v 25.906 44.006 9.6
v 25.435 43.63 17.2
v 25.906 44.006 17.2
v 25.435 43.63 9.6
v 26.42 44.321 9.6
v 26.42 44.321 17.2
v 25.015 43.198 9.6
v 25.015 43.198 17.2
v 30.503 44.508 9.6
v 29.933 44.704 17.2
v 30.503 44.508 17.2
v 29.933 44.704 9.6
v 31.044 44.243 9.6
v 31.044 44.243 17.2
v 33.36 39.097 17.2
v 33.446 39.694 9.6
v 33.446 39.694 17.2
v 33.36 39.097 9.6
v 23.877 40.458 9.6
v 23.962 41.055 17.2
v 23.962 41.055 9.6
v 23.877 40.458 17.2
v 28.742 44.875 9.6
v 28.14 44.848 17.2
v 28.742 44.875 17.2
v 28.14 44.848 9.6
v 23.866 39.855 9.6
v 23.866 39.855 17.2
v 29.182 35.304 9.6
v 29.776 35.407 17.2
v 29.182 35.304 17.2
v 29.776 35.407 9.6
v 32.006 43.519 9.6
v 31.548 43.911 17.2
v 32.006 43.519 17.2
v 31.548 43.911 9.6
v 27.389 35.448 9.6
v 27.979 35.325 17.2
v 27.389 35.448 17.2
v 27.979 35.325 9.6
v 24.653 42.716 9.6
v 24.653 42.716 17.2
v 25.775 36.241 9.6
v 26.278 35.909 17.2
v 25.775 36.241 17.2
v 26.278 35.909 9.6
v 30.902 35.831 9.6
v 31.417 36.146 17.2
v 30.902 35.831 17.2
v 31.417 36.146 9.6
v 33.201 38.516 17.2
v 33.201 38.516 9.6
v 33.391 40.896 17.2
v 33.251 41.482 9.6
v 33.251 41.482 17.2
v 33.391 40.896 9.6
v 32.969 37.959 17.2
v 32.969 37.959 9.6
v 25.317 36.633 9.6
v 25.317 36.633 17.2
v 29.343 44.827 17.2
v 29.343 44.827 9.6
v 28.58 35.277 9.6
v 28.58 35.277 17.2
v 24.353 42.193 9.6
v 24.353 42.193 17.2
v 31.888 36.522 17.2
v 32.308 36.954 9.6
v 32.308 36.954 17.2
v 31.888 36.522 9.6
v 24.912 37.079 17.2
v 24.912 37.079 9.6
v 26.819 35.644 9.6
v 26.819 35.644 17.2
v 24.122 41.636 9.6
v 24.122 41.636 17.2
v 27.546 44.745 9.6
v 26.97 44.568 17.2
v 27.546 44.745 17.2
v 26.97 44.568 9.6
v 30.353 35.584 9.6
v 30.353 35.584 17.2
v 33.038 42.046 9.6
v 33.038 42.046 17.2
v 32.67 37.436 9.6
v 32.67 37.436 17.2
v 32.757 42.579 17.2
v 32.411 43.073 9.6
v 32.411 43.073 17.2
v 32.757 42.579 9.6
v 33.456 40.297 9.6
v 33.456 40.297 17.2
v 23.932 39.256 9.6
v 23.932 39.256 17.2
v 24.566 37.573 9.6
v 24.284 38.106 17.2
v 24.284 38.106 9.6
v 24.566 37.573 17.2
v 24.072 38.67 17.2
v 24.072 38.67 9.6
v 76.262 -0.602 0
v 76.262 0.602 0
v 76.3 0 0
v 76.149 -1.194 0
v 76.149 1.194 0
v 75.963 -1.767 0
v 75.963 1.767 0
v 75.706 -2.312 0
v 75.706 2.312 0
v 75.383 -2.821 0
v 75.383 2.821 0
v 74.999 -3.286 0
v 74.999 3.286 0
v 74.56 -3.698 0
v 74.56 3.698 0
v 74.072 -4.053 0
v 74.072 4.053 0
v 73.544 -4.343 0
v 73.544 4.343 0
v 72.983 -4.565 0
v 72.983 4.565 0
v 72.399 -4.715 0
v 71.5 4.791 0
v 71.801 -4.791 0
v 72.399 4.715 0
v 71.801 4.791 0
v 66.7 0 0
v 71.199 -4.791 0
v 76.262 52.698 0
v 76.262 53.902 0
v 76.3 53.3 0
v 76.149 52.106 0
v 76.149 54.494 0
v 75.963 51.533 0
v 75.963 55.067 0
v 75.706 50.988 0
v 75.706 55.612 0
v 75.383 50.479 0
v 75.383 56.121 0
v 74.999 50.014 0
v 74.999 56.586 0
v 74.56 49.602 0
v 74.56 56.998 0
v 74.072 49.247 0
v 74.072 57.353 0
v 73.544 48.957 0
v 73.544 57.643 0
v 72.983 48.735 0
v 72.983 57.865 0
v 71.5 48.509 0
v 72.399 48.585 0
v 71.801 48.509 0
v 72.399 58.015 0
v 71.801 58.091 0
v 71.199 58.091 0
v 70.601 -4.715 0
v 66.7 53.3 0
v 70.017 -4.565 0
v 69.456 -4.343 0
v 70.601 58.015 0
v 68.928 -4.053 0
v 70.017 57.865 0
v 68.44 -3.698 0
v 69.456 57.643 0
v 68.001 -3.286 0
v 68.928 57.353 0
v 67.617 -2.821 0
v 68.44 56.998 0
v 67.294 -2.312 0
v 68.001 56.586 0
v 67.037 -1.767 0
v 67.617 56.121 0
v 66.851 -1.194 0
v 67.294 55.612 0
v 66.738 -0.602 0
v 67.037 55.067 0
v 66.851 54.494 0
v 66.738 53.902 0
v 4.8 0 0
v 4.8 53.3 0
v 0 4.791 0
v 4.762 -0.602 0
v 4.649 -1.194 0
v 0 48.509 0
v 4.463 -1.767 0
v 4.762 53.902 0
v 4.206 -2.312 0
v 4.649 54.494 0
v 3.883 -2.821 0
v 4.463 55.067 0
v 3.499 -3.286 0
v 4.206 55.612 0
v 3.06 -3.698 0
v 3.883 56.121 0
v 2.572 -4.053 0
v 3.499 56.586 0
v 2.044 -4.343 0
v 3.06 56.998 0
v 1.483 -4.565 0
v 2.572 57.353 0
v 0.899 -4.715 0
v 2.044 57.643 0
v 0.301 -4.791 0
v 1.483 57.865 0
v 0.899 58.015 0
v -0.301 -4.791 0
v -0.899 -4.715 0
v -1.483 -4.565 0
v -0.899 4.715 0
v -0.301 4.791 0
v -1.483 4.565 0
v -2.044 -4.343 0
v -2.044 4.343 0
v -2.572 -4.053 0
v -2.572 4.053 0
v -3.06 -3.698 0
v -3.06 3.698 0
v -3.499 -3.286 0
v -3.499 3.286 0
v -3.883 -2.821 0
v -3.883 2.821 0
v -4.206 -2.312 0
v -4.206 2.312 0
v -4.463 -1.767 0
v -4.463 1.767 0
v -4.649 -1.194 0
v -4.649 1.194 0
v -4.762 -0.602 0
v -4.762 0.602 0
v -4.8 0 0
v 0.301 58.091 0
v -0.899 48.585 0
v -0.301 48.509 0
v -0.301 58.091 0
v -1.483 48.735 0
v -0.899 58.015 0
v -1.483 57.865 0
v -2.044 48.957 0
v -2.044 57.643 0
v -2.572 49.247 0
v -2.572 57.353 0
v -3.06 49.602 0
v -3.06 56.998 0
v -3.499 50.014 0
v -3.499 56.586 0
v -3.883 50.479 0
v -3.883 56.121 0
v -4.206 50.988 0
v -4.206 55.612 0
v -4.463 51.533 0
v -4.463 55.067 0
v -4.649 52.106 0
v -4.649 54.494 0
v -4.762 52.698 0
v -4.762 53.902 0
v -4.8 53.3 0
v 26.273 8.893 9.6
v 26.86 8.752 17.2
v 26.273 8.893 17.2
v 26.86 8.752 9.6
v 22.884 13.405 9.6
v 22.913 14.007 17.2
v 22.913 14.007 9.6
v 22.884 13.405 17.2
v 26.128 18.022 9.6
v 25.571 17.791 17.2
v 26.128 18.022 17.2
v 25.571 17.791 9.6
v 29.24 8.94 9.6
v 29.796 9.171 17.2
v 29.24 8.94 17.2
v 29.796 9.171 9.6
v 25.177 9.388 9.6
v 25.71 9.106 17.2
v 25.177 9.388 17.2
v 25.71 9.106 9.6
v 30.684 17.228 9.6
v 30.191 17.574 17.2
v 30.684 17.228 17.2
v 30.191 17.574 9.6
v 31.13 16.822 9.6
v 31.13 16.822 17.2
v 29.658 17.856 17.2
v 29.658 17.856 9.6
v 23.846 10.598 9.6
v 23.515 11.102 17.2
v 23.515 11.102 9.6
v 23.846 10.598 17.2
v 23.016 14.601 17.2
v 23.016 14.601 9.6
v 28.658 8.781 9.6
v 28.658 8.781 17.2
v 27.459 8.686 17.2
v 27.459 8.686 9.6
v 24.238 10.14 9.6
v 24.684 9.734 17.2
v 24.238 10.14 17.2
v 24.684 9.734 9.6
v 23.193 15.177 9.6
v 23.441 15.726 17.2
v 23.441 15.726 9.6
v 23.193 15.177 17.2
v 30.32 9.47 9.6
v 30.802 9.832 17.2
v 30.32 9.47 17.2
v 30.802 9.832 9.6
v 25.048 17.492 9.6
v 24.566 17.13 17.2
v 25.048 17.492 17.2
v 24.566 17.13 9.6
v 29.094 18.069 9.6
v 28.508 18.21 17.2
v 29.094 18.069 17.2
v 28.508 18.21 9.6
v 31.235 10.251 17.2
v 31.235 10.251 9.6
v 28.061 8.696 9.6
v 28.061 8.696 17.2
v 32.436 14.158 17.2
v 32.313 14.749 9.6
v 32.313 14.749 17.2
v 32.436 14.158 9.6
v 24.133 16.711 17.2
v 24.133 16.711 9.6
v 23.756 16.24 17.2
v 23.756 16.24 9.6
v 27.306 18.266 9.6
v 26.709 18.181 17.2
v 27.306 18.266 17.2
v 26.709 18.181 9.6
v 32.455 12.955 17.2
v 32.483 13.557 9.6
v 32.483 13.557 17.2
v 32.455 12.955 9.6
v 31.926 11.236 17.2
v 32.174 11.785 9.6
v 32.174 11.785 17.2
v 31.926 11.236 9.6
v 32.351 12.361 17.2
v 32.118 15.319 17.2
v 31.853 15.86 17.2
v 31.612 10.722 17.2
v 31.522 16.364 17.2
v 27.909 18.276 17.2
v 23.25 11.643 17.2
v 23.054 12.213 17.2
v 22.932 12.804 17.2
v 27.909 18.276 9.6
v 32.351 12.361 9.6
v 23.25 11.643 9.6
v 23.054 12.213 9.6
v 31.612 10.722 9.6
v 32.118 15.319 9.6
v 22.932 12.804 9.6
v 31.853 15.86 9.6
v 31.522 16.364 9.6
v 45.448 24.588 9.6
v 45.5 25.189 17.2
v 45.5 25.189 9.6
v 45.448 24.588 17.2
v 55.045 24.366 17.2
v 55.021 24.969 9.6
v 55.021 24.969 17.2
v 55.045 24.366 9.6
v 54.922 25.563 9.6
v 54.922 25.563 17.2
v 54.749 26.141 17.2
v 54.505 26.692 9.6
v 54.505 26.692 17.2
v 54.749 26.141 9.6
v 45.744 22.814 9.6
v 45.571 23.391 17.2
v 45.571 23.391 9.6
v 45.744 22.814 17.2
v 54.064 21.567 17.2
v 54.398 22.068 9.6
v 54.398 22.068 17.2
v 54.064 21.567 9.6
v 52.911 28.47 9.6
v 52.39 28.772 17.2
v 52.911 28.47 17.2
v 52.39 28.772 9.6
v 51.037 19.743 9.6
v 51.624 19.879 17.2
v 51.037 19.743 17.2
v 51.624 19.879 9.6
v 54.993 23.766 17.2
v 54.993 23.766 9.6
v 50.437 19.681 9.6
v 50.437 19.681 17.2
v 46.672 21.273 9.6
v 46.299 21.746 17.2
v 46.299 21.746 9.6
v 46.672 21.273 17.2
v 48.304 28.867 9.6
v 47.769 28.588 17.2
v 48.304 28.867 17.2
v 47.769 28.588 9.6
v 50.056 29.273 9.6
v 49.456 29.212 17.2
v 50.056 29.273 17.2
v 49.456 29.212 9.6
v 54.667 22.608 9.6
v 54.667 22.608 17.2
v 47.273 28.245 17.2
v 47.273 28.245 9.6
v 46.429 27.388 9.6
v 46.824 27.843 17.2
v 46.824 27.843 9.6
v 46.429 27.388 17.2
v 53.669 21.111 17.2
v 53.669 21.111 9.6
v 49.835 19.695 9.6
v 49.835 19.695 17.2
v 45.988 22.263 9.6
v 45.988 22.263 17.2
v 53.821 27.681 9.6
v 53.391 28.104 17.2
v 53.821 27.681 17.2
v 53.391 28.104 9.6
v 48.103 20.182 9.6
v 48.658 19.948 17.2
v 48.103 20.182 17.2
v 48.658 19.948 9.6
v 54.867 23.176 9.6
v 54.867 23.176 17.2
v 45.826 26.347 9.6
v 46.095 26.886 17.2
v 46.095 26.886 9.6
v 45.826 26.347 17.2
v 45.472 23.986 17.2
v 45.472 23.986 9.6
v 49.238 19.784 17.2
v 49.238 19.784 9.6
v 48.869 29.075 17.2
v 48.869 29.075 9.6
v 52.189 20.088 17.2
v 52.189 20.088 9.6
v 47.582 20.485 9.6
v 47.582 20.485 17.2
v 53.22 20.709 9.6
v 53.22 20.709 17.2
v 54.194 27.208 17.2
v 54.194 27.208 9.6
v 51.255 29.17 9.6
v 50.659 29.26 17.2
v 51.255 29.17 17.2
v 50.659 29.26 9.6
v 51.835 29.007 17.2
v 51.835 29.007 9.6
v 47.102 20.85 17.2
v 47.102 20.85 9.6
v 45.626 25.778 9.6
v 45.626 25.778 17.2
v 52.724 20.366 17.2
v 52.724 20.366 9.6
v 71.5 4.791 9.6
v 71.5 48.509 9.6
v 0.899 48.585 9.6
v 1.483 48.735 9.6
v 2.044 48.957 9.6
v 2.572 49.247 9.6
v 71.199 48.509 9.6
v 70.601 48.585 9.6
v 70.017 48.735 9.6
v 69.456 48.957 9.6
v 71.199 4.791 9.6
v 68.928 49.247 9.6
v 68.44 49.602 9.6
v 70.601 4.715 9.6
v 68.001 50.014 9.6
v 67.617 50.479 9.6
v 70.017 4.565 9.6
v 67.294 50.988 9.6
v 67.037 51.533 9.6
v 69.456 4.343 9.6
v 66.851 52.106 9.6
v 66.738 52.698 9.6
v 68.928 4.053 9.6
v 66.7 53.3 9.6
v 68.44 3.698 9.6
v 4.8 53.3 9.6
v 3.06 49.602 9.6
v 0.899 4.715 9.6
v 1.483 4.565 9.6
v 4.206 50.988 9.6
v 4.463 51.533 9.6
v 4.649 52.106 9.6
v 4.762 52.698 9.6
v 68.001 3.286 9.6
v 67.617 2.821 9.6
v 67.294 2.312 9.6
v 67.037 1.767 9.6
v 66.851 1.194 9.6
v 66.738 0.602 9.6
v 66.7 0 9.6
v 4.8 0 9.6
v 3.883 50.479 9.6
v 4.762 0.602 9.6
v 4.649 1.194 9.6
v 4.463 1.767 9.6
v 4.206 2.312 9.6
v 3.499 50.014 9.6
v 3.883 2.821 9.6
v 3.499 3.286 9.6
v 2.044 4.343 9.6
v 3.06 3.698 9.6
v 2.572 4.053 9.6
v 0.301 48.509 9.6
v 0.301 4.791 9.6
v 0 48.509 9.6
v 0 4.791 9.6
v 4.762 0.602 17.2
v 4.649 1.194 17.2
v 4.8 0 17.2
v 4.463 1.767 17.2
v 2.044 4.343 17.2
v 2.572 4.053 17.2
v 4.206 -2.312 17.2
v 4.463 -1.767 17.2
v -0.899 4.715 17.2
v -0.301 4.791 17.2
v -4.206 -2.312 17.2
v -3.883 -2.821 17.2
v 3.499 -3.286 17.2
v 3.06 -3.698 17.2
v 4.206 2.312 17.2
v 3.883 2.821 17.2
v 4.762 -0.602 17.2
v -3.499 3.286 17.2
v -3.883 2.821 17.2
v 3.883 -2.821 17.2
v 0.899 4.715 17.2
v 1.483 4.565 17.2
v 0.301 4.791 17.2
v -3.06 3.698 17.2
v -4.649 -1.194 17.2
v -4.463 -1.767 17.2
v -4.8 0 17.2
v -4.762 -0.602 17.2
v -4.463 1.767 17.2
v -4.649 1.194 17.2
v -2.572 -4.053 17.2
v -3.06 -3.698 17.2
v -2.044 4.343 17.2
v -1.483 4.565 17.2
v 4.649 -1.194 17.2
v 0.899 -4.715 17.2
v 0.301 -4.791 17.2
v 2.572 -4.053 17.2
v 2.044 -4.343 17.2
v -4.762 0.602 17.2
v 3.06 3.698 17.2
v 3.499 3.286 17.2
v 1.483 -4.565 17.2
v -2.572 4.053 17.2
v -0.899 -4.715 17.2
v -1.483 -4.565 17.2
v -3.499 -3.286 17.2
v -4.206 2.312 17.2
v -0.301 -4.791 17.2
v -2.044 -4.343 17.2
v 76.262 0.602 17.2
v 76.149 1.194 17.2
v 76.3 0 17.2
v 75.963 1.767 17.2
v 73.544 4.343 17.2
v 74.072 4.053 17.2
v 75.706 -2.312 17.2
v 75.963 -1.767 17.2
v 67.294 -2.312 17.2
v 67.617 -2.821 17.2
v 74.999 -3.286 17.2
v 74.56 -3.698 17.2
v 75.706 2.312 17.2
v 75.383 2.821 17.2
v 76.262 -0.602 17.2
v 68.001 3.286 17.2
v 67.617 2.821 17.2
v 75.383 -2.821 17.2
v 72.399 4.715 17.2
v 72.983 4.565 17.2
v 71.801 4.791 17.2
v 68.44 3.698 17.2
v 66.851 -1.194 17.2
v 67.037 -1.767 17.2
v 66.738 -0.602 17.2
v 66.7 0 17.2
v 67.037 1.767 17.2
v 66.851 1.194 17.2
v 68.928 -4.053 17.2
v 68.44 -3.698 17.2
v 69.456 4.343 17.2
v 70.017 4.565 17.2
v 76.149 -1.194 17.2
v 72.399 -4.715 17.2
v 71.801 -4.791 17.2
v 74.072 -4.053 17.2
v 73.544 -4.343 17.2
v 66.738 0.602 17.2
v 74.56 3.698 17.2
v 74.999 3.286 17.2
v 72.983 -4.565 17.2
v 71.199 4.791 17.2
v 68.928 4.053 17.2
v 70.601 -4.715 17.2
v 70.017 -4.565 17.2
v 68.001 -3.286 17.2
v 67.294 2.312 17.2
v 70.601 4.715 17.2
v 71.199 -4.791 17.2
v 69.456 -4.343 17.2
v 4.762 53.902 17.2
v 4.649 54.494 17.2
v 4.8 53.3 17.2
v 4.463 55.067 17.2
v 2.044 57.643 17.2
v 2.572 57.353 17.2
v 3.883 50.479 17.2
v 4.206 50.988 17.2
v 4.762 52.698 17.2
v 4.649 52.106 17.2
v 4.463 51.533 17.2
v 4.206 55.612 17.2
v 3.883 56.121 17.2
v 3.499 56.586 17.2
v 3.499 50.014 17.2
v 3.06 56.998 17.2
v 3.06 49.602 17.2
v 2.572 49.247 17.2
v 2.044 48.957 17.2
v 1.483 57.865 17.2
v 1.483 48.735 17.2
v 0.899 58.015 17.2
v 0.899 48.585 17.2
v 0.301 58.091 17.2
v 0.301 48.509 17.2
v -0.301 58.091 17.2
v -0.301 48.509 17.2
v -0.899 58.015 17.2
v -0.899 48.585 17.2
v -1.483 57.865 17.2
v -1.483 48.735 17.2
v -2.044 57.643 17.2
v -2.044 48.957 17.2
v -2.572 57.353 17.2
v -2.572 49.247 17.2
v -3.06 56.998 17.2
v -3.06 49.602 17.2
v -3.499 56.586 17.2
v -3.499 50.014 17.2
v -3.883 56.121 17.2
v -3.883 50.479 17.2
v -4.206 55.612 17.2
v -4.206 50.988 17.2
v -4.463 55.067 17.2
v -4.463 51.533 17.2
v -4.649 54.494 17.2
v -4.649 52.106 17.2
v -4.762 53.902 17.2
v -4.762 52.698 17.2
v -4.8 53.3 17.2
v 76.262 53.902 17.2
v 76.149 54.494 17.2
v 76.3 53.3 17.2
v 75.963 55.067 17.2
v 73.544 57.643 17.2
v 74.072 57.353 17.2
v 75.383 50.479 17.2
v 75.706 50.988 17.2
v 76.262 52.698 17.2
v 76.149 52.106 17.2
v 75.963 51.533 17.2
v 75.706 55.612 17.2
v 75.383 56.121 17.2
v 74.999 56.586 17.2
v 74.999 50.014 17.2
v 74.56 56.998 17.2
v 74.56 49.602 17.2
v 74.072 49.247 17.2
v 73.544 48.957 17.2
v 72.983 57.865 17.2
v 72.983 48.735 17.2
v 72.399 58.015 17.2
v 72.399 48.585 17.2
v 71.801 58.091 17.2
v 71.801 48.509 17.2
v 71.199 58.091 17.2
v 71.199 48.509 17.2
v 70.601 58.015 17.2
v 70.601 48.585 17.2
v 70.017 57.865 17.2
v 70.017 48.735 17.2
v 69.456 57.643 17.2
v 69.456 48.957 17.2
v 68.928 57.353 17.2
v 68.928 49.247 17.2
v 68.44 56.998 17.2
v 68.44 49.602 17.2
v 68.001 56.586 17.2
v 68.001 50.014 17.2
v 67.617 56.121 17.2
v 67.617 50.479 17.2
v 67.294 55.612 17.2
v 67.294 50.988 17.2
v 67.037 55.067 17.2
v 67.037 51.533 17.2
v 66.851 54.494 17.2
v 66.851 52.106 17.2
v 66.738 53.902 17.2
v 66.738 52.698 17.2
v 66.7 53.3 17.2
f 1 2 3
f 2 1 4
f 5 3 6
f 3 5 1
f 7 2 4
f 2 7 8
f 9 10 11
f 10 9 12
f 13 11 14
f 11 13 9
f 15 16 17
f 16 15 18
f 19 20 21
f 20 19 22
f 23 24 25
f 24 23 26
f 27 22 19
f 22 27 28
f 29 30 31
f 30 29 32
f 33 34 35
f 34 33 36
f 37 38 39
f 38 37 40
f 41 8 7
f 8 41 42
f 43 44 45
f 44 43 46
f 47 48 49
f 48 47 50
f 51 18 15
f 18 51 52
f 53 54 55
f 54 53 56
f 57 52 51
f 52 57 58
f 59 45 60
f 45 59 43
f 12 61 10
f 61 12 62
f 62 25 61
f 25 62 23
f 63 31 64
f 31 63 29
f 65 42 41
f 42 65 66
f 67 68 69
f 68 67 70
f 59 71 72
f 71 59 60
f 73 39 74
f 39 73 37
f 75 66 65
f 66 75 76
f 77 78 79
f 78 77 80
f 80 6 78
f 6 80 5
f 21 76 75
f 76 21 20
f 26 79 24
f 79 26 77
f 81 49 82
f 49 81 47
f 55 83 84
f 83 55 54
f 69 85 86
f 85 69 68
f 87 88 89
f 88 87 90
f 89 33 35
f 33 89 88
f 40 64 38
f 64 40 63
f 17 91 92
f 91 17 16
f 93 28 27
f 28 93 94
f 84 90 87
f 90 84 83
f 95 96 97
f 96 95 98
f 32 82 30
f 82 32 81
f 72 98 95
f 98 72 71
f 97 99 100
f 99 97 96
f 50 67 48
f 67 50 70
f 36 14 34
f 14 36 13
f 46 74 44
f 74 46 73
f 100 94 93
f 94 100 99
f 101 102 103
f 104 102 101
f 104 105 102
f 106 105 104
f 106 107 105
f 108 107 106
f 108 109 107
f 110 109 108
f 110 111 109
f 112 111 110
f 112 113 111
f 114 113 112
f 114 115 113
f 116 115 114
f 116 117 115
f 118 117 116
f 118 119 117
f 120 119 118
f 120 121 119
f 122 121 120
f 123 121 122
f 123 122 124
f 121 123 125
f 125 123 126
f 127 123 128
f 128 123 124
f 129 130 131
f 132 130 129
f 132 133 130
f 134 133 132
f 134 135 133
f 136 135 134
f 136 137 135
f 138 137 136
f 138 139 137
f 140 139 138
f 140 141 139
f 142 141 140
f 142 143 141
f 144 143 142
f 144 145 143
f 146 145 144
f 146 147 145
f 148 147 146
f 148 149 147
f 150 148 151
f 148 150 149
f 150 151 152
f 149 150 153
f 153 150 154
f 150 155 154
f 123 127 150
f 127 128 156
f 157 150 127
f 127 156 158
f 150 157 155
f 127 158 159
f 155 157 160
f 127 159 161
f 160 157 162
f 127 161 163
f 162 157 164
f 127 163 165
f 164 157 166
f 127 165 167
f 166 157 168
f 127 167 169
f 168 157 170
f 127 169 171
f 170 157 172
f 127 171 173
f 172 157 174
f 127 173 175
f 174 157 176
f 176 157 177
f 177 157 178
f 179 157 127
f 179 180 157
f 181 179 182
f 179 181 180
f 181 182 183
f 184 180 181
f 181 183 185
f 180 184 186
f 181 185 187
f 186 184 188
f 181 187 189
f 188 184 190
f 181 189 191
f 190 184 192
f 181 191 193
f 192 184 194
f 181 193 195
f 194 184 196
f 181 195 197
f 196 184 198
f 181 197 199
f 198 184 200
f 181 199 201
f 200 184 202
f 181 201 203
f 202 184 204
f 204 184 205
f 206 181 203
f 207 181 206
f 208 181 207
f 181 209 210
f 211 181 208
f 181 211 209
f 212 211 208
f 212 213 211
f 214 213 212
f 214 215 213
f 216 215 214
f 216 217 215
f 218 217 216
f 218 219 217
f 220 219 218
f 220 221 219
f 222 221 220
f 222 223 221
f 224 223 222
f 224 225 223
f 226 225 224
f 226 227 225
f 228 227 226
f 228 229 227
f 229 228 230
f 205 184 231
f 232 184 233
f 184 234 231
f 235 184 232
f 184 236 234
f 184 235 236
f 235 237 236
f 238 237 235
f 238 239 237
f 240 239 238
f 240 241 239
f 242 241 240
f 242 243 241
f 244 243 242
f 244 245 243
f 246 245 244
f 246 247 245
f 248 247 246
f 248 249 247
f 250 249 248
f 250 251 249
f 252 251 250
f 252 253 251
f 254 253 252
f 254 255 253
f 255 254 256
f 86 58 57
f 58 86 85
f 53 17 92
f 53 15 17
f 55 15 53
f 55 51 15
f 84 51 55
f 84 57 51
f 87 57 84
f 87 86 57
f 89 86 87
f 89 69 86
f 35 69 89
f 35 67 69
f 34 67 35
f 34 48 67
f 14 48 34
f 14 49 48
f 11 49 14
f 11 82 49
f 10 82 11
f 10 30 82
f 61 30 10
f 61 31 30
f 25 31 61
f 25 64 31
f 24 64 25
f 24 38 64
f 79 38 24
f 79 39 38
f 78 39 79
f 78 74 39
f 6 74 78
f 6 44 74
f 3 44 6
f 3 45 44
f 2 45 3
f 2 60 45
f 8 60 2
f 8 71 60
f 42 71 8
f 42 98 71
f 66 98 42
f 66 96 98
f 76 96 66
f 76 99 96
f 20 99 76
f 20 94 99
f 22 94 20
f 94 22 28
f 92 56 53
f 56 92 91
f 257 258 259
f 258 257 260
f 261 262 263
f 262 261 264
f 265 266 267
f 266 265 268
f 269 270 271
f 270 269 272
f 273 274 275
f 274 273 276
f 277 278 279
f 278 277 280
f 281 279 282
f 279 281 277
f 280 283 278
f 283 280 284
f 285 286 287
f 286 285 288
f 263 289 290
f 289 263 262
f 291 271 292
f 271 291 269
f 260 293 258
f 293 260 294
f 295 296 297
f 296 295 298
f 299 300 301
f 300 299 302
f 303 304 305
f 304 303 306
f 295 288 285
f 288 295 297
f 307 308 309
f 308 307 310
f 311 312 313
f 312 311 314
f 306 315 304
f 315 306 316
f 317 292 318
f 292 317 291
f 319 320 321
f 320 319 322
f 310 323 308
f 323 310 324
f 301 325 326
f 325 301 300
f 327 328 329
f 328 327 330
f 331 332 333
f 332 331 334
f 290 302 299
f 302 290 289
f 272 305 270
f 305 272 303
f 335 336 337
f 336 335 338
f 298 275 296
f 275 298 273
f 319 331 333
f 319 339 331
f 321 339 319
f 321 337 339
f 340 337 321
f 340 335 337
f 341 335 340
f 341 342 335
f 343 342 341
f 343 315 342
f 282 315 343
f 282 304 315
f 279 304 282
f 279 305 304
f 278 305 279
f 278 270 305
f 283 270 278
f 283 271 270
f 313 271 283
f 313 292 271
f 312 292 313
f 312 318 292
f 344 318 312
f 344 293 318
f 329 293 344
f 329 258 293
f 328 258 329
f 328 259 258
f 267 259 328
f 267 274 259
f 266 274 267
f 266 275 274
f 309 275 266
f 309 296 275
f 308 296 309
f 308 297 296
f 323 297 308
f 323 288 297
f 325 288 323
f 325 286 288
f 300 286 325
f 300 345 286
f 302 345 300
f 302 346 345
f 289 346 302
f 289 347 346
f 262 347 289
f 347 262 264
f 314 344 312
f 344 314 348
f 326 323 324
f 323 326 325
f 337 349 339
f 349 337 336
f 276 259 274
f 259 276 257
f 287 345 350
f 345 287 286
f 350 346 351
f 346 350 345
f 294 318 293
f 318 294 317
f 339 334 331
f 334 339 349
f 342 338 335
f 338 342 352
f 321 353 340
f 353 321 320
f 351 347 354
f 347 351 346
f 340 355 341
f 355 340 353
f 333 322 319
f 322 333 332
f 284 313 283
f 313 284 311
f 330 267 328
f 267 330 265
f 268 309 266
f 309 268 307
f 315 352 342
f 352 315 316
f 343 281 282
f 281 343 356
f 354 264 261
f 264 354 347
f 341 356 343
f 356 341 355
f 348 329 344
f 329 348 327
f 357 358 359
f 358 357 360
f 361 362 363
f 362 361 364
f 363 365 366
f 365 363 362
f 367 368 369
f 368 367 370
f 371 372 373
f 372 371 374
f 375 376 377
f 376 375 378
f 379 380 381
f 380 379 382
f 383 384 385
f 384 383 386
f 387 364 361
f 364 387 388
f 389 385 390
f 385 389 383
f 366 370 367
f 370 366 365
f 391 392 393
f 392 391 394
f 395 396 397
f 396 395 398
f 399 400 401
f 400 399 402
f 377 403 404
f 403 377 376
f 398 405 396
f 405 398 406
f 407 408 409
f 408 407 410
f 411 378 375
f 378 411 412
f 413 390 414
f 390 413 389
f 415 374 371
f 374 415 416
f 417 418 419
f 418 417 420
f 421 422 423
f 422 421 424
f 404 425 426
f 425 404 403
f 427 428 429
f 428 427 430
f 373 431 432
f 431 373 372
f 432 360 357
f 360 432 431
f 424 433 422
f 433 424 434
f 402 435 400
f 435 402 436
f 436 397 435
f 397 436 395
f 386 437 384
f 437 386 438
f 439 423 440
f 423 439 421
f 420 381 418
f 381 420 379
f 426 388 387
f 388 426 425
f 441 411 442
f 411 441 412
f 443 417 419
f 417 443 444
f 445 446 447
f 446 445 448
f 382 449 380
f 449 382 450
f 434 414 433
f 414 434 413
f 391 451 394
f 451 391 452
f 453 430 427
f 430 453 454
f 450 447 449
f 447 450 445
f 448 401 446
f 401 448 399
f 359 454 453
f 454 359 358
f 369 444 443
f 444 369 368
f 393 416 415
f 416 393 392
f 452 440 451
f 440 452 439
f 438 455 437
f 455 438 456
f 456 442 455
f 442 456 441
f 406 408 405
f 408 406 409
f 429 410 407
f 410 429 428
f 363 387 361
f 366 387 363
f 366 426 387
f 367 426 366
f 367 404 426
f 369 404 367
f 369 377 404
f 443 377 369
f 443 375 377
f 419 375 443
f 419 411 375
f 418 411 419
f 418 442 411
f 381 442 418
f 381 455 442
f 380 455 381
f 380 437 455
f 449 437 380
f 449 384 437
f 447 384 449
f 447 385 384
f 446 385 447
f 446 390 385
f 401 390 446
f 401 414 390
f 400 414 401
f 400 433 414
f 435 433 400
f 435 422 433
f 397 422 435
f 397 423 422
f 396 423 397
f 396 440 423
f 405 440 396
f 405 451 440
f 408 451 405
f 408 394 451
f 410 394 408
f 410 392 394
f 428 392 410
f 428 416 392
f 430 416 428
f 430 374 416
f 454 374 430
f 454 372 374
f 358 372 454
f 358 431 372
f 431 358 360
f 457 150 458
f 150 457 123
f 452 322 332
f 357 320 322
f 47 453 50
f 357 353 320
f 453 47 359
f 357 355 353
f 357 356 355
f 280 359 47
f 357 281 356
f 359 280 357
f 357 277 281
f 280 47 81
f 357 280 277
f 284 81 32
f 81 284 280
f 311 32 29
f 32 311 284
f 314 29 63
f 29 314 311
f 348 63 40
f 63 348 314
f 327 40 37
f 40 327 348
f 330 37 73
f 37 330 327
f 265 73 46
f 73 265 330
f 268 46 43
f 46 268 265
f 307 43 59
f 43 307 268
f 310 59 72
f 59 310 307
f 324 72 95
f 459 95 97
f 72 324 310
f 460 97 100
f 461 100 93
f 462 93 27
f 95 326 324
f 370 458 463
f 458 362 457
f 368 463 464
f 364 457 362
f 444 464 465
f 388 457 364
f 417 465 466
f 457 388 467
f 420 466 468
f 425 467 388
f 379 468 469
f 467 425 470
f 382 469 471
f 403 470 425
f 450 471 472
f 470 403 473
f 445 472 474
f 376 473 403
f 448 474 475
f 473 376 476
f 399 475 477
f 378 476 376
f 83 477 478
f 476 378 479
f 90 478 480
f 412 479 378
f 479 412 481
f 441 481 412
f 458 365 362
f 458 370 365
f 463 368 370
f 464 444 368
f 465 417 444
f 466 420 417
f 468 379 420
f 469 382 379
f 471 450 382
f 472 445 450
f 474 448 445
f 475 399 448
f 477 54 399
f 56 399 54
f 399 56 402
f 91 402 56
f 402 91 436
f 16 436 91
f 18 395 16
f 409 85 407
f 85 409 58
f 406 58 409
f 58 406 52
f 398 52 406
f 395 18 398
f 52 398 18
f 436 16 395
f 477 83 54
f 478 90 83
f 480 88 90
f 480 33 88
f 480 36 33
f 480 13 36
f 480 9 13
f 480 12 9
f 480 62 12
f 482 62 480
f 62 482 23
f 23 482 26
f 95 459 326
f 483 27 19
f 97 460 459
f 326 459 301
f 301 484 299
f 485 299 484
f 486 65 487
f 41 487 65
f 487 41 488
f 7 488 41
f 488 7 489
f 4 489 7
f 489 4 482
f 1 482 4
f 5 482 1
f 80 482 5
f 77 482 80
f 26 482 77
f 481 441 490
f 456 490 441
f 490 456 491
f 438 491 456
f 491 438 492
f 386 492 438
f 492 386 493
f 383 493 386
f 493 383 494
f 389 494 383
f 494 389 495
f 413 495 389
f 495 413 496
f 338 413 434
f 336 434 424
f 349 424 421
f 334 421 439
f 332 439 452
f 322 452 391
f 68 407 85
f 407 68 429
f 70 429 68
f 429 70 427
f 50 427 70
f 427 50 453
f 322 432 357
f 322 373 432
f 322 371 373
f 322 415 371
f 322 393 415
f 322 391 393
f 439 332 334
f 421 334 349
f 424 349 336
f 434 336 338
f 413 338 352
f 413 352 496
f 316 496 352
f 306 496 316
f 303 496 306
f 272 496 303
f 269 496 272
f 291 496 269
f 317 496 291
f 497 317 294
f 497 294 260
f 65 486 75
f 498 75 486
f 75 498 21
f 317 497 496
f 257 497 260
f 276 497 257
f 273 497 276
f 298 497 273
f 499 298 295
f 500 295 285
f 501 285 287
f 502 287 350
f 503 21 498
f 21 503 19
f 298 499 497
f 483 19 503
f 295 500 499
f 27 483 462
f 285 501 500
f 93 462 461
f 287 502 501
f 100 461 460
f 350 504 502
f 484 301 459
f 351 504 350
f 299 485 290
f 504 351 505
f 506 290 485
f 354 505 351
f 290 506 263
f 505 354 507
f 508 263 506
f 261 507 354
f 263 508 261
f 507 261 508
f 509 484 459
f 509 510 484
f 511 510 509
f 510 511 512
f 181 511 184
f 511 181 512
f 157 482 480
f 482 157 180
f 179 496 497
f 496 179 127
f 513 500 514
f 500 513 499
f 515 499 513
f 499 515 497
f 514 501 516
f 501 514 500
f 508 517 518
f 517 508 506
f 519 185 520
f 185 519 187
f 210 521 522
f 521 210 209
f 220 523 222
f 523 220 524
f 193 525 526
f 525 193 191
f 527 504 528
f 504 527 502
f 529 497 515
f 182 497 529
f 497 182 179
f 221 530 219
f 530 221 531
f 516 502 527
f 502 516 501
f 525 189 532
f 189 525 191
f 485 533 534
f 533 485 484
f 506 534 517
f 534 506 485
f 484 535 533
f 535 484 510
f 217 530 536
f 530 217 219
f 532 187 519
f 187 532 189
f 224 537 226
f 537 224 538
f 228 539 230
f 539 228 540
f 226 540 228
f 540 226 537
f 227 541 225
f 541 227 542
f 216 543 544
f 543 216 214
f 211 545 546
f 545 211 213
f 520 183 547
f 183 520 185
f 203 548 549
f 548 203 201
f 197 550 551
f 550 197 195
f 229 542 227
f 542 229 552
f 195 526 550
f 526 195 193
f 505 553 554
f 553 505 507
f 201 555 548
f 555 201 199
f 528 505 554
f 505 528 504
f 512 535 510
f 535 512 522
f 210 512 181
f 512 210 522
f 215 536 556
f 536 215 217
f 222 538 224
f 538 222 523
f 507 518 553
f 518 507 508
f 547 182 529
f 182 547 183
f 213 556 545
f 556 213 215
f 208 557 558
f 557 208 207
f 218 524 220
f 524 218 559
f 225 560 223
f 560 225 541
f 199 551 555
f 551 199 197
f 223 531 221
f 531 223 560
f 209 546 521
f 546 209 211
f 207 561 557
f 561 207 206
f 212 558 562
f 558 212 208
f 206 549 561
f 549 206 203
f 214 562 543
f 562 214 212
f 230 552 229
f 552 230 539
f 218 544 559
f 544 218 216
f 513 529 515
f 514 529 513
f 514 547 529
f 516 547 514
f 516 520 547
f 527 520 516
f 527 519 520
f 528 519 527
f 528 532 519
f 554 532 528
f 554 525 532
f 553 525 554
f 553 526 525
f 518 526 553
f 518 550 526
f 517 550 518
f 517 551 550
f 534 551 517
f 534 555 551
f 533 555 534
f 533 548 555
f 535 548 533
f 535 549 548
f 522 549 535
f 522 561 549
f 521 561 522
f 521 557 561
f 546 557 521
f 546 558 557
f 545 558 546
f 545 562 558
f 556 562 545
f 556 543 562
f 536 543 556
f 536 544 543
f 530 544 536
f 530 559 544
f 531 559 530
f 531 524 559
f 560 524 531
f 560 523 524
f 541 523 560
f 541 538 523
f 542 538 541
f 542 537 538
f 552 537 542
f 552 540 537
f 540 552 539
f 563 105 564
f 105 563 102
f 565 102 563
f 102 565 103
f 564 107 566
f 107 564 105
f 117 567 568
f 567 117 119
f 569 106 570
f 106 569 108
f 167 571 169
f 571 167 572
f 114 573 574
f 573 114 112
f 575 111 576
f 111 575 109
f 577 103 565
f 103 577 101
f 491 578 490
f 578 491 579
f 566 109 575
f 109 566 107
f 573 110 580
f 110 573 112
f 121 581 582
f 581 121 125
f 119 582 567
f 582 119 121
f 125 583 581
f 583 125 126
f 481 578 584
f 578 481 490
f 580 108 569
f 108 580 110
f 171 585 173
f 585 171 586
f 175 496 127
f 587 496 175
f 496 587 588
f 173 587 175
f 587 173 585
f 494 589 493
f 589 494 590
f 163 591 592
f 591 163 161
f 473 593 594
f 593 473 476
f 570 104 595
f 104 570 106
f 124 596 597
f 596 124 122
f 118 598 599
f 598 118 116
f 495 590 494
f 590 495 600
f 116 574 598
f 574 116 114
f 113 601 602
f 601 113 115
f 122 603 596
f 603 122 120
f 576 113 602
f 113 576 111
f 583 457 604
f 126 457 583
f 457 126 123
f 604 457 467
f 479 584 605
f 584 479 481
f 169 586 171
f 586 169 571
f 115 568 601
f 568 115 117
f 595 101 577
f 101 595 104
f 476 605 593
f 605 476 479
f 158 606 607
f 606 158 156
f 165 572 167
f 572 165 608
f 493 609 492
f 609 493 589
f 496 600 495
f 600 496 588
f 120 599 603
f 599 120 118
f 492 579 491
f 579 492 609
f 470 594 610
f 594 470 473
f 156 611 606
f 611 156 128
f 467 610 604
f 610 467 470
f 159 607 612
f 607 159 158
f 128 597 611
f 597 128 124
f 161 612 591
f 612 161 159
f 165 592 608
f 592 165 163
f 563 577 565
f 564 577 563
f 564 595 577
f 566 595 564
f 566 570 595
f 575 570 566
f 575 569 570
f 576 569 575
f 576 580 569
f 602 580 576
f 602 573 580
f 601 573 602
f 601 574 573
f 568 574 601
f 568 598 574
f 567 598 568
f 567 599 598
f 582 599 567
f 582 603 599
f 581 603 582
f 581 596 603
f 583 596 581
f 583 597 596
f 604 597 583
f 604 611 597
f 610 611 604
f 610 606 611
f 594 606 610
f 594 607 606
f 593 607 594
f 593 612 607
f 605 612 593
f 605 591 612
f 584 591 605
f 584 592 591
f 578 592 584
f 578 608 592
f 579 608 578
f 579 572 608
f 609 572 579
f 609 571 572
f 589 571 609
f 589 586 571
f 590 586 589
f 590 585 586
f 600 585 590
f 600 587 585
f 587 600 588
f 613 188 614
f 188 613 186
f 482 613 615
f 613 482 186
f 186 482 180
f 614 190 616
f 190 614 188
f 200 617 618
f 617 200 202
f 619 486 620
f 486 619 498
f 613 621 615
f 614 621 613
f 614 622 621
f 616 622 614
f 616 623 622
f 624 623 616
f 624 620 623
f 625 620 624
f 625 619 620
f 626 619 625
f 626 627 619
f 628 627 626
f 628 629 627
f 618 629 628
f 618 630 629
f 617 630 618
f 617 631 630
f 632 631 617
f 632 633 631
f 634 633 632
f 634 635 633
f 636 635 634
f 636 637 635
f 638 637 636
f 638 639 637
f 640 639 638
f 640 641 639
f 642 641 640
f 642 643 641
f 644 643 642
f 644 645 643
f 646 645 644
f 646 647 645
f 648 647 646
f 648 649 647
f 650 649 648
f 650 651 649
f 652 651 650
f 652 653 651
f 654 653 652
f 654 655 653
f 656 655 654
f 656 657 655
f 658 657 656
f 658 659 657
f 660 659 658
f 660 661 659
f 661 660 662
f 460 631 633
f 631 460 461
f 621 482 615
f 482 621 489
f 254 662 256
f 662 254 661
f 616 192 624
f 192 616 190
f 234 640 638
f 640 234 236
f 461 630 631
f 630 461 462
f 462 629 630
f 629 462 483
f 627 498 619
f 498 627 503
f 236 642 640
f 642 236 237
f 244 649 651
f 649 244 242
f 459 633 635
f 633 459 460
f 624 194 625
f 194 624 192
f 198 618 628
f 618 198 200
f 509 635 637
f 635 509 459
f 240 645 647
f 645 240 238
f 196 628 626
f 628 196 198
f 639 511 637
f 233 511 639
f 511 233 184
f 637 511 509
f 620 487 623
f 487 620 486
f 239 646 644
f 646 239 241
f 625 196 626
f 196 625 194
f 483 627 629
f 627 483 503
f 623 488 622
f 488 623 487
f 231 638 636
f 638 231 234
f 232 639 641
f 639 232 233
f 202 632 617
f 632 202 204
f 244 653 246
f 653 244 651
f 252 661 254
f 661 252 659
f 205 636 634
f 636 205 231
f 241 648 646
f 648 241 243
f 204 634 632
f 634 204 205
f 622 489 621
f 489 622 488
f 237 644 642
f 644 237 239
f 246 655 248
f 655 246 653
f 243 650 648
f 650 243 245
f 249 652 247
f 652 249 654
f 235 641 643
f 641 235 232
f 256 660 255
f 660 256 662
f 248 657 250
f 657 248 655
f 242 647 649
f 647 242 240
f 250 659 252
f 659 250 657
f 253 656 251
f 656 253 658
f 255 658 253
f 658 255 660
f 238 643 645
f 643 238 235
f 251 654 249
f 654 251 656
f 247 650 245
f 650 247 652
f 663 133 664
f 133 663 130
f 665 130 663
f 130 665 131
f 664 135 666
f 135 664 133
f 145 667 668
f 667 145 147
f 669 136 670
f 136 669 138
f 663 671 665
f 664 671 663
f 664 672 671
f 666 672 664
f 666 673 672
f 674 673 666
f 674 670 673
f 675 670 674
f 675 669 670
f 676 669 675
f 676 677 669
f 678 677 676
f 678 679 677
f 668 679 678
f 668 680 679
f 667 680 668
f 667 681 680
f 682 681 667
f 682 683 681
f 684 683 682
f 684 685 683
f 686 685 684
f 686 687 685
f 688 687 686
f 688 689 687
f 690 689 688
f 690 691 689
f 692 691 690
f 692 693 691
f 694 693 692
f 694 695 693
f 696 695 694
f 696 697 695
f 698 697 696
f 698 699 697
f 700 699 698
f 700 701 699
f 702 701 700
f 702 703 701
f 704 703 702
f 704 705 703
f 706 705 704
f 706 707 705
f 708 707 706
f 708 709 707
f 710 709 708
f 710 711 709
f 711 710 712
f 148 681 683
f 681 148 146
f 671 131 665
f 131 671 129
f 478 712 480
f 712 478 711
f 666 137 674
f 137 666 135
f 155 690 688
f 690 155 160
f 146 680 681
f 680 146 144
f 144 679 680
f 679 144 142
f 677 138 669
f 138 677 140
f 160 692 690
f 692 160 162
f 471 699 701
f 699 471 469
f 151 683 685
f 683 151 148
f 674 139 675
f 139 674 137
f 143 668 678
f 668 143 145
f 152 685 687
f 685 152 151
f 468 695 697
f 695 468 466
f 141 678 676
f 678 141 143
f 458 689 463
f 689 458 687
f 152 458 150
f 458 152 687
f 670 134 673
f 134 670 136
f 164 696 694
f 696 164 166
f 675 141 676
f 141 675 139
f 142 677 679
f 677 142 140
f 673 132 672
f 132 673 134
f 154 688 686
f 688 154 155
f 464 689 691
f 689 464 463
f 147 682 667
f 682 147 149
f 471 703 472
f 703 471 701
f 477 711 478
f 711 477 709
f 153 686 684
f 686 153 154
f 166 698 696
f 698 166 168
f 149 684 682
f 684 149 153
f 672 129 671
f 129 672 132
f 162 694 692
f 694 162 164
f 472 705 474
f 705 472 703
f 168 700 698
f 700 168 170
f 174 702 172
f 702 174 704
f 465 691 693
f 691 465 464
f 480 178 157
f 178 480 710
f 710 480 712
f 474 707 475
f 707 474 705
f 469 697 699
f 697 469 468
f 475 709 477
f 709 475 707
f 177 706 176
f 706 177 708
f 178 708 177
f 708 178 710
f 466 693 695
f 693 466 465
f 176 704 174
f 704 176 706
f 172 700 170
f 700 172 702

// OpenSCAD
$fn = 50;

s = 1.3;

x = 55*s;
y = 41*s; 
z = 9.6;

ultra = 18*s;

cylHeight = 17.2;
cylRad = 9.6/2;

oddCylShift = ultra*sin(30);

module cyl(){
	cylinder(r=cylRad, h=cylHeight);
}

module centerEquilateralTriangle(count, distance){
	cir = 360;
	rot = cir/count;
	for(i = [1:count], randRot = i*rands(110,rot,1)[0]){
		echo("sub rotation ", i, randRot);
		rotate([0,0,randRot])
		translate([rands(14,distance,1)[0],0,0])
		cyl();
	}
}

module mainPart() {
	randFullRot = rands(0,360,1)[0];
	union(){
		cube([x,y,z]);
		
		cyl();
		
		translate([x,0,0])
		cyl();
		
		translate([0,y,0])
		cyl();

		translate([x,y,0])
		cyl();
		
		echo("full-rot:", randFullRot);
		translate([x/2, y/2,0])
		rotate([0,0,randFullRot])
		centerEquilateralTriangle(3, 16);
	}
}

mainPart();
